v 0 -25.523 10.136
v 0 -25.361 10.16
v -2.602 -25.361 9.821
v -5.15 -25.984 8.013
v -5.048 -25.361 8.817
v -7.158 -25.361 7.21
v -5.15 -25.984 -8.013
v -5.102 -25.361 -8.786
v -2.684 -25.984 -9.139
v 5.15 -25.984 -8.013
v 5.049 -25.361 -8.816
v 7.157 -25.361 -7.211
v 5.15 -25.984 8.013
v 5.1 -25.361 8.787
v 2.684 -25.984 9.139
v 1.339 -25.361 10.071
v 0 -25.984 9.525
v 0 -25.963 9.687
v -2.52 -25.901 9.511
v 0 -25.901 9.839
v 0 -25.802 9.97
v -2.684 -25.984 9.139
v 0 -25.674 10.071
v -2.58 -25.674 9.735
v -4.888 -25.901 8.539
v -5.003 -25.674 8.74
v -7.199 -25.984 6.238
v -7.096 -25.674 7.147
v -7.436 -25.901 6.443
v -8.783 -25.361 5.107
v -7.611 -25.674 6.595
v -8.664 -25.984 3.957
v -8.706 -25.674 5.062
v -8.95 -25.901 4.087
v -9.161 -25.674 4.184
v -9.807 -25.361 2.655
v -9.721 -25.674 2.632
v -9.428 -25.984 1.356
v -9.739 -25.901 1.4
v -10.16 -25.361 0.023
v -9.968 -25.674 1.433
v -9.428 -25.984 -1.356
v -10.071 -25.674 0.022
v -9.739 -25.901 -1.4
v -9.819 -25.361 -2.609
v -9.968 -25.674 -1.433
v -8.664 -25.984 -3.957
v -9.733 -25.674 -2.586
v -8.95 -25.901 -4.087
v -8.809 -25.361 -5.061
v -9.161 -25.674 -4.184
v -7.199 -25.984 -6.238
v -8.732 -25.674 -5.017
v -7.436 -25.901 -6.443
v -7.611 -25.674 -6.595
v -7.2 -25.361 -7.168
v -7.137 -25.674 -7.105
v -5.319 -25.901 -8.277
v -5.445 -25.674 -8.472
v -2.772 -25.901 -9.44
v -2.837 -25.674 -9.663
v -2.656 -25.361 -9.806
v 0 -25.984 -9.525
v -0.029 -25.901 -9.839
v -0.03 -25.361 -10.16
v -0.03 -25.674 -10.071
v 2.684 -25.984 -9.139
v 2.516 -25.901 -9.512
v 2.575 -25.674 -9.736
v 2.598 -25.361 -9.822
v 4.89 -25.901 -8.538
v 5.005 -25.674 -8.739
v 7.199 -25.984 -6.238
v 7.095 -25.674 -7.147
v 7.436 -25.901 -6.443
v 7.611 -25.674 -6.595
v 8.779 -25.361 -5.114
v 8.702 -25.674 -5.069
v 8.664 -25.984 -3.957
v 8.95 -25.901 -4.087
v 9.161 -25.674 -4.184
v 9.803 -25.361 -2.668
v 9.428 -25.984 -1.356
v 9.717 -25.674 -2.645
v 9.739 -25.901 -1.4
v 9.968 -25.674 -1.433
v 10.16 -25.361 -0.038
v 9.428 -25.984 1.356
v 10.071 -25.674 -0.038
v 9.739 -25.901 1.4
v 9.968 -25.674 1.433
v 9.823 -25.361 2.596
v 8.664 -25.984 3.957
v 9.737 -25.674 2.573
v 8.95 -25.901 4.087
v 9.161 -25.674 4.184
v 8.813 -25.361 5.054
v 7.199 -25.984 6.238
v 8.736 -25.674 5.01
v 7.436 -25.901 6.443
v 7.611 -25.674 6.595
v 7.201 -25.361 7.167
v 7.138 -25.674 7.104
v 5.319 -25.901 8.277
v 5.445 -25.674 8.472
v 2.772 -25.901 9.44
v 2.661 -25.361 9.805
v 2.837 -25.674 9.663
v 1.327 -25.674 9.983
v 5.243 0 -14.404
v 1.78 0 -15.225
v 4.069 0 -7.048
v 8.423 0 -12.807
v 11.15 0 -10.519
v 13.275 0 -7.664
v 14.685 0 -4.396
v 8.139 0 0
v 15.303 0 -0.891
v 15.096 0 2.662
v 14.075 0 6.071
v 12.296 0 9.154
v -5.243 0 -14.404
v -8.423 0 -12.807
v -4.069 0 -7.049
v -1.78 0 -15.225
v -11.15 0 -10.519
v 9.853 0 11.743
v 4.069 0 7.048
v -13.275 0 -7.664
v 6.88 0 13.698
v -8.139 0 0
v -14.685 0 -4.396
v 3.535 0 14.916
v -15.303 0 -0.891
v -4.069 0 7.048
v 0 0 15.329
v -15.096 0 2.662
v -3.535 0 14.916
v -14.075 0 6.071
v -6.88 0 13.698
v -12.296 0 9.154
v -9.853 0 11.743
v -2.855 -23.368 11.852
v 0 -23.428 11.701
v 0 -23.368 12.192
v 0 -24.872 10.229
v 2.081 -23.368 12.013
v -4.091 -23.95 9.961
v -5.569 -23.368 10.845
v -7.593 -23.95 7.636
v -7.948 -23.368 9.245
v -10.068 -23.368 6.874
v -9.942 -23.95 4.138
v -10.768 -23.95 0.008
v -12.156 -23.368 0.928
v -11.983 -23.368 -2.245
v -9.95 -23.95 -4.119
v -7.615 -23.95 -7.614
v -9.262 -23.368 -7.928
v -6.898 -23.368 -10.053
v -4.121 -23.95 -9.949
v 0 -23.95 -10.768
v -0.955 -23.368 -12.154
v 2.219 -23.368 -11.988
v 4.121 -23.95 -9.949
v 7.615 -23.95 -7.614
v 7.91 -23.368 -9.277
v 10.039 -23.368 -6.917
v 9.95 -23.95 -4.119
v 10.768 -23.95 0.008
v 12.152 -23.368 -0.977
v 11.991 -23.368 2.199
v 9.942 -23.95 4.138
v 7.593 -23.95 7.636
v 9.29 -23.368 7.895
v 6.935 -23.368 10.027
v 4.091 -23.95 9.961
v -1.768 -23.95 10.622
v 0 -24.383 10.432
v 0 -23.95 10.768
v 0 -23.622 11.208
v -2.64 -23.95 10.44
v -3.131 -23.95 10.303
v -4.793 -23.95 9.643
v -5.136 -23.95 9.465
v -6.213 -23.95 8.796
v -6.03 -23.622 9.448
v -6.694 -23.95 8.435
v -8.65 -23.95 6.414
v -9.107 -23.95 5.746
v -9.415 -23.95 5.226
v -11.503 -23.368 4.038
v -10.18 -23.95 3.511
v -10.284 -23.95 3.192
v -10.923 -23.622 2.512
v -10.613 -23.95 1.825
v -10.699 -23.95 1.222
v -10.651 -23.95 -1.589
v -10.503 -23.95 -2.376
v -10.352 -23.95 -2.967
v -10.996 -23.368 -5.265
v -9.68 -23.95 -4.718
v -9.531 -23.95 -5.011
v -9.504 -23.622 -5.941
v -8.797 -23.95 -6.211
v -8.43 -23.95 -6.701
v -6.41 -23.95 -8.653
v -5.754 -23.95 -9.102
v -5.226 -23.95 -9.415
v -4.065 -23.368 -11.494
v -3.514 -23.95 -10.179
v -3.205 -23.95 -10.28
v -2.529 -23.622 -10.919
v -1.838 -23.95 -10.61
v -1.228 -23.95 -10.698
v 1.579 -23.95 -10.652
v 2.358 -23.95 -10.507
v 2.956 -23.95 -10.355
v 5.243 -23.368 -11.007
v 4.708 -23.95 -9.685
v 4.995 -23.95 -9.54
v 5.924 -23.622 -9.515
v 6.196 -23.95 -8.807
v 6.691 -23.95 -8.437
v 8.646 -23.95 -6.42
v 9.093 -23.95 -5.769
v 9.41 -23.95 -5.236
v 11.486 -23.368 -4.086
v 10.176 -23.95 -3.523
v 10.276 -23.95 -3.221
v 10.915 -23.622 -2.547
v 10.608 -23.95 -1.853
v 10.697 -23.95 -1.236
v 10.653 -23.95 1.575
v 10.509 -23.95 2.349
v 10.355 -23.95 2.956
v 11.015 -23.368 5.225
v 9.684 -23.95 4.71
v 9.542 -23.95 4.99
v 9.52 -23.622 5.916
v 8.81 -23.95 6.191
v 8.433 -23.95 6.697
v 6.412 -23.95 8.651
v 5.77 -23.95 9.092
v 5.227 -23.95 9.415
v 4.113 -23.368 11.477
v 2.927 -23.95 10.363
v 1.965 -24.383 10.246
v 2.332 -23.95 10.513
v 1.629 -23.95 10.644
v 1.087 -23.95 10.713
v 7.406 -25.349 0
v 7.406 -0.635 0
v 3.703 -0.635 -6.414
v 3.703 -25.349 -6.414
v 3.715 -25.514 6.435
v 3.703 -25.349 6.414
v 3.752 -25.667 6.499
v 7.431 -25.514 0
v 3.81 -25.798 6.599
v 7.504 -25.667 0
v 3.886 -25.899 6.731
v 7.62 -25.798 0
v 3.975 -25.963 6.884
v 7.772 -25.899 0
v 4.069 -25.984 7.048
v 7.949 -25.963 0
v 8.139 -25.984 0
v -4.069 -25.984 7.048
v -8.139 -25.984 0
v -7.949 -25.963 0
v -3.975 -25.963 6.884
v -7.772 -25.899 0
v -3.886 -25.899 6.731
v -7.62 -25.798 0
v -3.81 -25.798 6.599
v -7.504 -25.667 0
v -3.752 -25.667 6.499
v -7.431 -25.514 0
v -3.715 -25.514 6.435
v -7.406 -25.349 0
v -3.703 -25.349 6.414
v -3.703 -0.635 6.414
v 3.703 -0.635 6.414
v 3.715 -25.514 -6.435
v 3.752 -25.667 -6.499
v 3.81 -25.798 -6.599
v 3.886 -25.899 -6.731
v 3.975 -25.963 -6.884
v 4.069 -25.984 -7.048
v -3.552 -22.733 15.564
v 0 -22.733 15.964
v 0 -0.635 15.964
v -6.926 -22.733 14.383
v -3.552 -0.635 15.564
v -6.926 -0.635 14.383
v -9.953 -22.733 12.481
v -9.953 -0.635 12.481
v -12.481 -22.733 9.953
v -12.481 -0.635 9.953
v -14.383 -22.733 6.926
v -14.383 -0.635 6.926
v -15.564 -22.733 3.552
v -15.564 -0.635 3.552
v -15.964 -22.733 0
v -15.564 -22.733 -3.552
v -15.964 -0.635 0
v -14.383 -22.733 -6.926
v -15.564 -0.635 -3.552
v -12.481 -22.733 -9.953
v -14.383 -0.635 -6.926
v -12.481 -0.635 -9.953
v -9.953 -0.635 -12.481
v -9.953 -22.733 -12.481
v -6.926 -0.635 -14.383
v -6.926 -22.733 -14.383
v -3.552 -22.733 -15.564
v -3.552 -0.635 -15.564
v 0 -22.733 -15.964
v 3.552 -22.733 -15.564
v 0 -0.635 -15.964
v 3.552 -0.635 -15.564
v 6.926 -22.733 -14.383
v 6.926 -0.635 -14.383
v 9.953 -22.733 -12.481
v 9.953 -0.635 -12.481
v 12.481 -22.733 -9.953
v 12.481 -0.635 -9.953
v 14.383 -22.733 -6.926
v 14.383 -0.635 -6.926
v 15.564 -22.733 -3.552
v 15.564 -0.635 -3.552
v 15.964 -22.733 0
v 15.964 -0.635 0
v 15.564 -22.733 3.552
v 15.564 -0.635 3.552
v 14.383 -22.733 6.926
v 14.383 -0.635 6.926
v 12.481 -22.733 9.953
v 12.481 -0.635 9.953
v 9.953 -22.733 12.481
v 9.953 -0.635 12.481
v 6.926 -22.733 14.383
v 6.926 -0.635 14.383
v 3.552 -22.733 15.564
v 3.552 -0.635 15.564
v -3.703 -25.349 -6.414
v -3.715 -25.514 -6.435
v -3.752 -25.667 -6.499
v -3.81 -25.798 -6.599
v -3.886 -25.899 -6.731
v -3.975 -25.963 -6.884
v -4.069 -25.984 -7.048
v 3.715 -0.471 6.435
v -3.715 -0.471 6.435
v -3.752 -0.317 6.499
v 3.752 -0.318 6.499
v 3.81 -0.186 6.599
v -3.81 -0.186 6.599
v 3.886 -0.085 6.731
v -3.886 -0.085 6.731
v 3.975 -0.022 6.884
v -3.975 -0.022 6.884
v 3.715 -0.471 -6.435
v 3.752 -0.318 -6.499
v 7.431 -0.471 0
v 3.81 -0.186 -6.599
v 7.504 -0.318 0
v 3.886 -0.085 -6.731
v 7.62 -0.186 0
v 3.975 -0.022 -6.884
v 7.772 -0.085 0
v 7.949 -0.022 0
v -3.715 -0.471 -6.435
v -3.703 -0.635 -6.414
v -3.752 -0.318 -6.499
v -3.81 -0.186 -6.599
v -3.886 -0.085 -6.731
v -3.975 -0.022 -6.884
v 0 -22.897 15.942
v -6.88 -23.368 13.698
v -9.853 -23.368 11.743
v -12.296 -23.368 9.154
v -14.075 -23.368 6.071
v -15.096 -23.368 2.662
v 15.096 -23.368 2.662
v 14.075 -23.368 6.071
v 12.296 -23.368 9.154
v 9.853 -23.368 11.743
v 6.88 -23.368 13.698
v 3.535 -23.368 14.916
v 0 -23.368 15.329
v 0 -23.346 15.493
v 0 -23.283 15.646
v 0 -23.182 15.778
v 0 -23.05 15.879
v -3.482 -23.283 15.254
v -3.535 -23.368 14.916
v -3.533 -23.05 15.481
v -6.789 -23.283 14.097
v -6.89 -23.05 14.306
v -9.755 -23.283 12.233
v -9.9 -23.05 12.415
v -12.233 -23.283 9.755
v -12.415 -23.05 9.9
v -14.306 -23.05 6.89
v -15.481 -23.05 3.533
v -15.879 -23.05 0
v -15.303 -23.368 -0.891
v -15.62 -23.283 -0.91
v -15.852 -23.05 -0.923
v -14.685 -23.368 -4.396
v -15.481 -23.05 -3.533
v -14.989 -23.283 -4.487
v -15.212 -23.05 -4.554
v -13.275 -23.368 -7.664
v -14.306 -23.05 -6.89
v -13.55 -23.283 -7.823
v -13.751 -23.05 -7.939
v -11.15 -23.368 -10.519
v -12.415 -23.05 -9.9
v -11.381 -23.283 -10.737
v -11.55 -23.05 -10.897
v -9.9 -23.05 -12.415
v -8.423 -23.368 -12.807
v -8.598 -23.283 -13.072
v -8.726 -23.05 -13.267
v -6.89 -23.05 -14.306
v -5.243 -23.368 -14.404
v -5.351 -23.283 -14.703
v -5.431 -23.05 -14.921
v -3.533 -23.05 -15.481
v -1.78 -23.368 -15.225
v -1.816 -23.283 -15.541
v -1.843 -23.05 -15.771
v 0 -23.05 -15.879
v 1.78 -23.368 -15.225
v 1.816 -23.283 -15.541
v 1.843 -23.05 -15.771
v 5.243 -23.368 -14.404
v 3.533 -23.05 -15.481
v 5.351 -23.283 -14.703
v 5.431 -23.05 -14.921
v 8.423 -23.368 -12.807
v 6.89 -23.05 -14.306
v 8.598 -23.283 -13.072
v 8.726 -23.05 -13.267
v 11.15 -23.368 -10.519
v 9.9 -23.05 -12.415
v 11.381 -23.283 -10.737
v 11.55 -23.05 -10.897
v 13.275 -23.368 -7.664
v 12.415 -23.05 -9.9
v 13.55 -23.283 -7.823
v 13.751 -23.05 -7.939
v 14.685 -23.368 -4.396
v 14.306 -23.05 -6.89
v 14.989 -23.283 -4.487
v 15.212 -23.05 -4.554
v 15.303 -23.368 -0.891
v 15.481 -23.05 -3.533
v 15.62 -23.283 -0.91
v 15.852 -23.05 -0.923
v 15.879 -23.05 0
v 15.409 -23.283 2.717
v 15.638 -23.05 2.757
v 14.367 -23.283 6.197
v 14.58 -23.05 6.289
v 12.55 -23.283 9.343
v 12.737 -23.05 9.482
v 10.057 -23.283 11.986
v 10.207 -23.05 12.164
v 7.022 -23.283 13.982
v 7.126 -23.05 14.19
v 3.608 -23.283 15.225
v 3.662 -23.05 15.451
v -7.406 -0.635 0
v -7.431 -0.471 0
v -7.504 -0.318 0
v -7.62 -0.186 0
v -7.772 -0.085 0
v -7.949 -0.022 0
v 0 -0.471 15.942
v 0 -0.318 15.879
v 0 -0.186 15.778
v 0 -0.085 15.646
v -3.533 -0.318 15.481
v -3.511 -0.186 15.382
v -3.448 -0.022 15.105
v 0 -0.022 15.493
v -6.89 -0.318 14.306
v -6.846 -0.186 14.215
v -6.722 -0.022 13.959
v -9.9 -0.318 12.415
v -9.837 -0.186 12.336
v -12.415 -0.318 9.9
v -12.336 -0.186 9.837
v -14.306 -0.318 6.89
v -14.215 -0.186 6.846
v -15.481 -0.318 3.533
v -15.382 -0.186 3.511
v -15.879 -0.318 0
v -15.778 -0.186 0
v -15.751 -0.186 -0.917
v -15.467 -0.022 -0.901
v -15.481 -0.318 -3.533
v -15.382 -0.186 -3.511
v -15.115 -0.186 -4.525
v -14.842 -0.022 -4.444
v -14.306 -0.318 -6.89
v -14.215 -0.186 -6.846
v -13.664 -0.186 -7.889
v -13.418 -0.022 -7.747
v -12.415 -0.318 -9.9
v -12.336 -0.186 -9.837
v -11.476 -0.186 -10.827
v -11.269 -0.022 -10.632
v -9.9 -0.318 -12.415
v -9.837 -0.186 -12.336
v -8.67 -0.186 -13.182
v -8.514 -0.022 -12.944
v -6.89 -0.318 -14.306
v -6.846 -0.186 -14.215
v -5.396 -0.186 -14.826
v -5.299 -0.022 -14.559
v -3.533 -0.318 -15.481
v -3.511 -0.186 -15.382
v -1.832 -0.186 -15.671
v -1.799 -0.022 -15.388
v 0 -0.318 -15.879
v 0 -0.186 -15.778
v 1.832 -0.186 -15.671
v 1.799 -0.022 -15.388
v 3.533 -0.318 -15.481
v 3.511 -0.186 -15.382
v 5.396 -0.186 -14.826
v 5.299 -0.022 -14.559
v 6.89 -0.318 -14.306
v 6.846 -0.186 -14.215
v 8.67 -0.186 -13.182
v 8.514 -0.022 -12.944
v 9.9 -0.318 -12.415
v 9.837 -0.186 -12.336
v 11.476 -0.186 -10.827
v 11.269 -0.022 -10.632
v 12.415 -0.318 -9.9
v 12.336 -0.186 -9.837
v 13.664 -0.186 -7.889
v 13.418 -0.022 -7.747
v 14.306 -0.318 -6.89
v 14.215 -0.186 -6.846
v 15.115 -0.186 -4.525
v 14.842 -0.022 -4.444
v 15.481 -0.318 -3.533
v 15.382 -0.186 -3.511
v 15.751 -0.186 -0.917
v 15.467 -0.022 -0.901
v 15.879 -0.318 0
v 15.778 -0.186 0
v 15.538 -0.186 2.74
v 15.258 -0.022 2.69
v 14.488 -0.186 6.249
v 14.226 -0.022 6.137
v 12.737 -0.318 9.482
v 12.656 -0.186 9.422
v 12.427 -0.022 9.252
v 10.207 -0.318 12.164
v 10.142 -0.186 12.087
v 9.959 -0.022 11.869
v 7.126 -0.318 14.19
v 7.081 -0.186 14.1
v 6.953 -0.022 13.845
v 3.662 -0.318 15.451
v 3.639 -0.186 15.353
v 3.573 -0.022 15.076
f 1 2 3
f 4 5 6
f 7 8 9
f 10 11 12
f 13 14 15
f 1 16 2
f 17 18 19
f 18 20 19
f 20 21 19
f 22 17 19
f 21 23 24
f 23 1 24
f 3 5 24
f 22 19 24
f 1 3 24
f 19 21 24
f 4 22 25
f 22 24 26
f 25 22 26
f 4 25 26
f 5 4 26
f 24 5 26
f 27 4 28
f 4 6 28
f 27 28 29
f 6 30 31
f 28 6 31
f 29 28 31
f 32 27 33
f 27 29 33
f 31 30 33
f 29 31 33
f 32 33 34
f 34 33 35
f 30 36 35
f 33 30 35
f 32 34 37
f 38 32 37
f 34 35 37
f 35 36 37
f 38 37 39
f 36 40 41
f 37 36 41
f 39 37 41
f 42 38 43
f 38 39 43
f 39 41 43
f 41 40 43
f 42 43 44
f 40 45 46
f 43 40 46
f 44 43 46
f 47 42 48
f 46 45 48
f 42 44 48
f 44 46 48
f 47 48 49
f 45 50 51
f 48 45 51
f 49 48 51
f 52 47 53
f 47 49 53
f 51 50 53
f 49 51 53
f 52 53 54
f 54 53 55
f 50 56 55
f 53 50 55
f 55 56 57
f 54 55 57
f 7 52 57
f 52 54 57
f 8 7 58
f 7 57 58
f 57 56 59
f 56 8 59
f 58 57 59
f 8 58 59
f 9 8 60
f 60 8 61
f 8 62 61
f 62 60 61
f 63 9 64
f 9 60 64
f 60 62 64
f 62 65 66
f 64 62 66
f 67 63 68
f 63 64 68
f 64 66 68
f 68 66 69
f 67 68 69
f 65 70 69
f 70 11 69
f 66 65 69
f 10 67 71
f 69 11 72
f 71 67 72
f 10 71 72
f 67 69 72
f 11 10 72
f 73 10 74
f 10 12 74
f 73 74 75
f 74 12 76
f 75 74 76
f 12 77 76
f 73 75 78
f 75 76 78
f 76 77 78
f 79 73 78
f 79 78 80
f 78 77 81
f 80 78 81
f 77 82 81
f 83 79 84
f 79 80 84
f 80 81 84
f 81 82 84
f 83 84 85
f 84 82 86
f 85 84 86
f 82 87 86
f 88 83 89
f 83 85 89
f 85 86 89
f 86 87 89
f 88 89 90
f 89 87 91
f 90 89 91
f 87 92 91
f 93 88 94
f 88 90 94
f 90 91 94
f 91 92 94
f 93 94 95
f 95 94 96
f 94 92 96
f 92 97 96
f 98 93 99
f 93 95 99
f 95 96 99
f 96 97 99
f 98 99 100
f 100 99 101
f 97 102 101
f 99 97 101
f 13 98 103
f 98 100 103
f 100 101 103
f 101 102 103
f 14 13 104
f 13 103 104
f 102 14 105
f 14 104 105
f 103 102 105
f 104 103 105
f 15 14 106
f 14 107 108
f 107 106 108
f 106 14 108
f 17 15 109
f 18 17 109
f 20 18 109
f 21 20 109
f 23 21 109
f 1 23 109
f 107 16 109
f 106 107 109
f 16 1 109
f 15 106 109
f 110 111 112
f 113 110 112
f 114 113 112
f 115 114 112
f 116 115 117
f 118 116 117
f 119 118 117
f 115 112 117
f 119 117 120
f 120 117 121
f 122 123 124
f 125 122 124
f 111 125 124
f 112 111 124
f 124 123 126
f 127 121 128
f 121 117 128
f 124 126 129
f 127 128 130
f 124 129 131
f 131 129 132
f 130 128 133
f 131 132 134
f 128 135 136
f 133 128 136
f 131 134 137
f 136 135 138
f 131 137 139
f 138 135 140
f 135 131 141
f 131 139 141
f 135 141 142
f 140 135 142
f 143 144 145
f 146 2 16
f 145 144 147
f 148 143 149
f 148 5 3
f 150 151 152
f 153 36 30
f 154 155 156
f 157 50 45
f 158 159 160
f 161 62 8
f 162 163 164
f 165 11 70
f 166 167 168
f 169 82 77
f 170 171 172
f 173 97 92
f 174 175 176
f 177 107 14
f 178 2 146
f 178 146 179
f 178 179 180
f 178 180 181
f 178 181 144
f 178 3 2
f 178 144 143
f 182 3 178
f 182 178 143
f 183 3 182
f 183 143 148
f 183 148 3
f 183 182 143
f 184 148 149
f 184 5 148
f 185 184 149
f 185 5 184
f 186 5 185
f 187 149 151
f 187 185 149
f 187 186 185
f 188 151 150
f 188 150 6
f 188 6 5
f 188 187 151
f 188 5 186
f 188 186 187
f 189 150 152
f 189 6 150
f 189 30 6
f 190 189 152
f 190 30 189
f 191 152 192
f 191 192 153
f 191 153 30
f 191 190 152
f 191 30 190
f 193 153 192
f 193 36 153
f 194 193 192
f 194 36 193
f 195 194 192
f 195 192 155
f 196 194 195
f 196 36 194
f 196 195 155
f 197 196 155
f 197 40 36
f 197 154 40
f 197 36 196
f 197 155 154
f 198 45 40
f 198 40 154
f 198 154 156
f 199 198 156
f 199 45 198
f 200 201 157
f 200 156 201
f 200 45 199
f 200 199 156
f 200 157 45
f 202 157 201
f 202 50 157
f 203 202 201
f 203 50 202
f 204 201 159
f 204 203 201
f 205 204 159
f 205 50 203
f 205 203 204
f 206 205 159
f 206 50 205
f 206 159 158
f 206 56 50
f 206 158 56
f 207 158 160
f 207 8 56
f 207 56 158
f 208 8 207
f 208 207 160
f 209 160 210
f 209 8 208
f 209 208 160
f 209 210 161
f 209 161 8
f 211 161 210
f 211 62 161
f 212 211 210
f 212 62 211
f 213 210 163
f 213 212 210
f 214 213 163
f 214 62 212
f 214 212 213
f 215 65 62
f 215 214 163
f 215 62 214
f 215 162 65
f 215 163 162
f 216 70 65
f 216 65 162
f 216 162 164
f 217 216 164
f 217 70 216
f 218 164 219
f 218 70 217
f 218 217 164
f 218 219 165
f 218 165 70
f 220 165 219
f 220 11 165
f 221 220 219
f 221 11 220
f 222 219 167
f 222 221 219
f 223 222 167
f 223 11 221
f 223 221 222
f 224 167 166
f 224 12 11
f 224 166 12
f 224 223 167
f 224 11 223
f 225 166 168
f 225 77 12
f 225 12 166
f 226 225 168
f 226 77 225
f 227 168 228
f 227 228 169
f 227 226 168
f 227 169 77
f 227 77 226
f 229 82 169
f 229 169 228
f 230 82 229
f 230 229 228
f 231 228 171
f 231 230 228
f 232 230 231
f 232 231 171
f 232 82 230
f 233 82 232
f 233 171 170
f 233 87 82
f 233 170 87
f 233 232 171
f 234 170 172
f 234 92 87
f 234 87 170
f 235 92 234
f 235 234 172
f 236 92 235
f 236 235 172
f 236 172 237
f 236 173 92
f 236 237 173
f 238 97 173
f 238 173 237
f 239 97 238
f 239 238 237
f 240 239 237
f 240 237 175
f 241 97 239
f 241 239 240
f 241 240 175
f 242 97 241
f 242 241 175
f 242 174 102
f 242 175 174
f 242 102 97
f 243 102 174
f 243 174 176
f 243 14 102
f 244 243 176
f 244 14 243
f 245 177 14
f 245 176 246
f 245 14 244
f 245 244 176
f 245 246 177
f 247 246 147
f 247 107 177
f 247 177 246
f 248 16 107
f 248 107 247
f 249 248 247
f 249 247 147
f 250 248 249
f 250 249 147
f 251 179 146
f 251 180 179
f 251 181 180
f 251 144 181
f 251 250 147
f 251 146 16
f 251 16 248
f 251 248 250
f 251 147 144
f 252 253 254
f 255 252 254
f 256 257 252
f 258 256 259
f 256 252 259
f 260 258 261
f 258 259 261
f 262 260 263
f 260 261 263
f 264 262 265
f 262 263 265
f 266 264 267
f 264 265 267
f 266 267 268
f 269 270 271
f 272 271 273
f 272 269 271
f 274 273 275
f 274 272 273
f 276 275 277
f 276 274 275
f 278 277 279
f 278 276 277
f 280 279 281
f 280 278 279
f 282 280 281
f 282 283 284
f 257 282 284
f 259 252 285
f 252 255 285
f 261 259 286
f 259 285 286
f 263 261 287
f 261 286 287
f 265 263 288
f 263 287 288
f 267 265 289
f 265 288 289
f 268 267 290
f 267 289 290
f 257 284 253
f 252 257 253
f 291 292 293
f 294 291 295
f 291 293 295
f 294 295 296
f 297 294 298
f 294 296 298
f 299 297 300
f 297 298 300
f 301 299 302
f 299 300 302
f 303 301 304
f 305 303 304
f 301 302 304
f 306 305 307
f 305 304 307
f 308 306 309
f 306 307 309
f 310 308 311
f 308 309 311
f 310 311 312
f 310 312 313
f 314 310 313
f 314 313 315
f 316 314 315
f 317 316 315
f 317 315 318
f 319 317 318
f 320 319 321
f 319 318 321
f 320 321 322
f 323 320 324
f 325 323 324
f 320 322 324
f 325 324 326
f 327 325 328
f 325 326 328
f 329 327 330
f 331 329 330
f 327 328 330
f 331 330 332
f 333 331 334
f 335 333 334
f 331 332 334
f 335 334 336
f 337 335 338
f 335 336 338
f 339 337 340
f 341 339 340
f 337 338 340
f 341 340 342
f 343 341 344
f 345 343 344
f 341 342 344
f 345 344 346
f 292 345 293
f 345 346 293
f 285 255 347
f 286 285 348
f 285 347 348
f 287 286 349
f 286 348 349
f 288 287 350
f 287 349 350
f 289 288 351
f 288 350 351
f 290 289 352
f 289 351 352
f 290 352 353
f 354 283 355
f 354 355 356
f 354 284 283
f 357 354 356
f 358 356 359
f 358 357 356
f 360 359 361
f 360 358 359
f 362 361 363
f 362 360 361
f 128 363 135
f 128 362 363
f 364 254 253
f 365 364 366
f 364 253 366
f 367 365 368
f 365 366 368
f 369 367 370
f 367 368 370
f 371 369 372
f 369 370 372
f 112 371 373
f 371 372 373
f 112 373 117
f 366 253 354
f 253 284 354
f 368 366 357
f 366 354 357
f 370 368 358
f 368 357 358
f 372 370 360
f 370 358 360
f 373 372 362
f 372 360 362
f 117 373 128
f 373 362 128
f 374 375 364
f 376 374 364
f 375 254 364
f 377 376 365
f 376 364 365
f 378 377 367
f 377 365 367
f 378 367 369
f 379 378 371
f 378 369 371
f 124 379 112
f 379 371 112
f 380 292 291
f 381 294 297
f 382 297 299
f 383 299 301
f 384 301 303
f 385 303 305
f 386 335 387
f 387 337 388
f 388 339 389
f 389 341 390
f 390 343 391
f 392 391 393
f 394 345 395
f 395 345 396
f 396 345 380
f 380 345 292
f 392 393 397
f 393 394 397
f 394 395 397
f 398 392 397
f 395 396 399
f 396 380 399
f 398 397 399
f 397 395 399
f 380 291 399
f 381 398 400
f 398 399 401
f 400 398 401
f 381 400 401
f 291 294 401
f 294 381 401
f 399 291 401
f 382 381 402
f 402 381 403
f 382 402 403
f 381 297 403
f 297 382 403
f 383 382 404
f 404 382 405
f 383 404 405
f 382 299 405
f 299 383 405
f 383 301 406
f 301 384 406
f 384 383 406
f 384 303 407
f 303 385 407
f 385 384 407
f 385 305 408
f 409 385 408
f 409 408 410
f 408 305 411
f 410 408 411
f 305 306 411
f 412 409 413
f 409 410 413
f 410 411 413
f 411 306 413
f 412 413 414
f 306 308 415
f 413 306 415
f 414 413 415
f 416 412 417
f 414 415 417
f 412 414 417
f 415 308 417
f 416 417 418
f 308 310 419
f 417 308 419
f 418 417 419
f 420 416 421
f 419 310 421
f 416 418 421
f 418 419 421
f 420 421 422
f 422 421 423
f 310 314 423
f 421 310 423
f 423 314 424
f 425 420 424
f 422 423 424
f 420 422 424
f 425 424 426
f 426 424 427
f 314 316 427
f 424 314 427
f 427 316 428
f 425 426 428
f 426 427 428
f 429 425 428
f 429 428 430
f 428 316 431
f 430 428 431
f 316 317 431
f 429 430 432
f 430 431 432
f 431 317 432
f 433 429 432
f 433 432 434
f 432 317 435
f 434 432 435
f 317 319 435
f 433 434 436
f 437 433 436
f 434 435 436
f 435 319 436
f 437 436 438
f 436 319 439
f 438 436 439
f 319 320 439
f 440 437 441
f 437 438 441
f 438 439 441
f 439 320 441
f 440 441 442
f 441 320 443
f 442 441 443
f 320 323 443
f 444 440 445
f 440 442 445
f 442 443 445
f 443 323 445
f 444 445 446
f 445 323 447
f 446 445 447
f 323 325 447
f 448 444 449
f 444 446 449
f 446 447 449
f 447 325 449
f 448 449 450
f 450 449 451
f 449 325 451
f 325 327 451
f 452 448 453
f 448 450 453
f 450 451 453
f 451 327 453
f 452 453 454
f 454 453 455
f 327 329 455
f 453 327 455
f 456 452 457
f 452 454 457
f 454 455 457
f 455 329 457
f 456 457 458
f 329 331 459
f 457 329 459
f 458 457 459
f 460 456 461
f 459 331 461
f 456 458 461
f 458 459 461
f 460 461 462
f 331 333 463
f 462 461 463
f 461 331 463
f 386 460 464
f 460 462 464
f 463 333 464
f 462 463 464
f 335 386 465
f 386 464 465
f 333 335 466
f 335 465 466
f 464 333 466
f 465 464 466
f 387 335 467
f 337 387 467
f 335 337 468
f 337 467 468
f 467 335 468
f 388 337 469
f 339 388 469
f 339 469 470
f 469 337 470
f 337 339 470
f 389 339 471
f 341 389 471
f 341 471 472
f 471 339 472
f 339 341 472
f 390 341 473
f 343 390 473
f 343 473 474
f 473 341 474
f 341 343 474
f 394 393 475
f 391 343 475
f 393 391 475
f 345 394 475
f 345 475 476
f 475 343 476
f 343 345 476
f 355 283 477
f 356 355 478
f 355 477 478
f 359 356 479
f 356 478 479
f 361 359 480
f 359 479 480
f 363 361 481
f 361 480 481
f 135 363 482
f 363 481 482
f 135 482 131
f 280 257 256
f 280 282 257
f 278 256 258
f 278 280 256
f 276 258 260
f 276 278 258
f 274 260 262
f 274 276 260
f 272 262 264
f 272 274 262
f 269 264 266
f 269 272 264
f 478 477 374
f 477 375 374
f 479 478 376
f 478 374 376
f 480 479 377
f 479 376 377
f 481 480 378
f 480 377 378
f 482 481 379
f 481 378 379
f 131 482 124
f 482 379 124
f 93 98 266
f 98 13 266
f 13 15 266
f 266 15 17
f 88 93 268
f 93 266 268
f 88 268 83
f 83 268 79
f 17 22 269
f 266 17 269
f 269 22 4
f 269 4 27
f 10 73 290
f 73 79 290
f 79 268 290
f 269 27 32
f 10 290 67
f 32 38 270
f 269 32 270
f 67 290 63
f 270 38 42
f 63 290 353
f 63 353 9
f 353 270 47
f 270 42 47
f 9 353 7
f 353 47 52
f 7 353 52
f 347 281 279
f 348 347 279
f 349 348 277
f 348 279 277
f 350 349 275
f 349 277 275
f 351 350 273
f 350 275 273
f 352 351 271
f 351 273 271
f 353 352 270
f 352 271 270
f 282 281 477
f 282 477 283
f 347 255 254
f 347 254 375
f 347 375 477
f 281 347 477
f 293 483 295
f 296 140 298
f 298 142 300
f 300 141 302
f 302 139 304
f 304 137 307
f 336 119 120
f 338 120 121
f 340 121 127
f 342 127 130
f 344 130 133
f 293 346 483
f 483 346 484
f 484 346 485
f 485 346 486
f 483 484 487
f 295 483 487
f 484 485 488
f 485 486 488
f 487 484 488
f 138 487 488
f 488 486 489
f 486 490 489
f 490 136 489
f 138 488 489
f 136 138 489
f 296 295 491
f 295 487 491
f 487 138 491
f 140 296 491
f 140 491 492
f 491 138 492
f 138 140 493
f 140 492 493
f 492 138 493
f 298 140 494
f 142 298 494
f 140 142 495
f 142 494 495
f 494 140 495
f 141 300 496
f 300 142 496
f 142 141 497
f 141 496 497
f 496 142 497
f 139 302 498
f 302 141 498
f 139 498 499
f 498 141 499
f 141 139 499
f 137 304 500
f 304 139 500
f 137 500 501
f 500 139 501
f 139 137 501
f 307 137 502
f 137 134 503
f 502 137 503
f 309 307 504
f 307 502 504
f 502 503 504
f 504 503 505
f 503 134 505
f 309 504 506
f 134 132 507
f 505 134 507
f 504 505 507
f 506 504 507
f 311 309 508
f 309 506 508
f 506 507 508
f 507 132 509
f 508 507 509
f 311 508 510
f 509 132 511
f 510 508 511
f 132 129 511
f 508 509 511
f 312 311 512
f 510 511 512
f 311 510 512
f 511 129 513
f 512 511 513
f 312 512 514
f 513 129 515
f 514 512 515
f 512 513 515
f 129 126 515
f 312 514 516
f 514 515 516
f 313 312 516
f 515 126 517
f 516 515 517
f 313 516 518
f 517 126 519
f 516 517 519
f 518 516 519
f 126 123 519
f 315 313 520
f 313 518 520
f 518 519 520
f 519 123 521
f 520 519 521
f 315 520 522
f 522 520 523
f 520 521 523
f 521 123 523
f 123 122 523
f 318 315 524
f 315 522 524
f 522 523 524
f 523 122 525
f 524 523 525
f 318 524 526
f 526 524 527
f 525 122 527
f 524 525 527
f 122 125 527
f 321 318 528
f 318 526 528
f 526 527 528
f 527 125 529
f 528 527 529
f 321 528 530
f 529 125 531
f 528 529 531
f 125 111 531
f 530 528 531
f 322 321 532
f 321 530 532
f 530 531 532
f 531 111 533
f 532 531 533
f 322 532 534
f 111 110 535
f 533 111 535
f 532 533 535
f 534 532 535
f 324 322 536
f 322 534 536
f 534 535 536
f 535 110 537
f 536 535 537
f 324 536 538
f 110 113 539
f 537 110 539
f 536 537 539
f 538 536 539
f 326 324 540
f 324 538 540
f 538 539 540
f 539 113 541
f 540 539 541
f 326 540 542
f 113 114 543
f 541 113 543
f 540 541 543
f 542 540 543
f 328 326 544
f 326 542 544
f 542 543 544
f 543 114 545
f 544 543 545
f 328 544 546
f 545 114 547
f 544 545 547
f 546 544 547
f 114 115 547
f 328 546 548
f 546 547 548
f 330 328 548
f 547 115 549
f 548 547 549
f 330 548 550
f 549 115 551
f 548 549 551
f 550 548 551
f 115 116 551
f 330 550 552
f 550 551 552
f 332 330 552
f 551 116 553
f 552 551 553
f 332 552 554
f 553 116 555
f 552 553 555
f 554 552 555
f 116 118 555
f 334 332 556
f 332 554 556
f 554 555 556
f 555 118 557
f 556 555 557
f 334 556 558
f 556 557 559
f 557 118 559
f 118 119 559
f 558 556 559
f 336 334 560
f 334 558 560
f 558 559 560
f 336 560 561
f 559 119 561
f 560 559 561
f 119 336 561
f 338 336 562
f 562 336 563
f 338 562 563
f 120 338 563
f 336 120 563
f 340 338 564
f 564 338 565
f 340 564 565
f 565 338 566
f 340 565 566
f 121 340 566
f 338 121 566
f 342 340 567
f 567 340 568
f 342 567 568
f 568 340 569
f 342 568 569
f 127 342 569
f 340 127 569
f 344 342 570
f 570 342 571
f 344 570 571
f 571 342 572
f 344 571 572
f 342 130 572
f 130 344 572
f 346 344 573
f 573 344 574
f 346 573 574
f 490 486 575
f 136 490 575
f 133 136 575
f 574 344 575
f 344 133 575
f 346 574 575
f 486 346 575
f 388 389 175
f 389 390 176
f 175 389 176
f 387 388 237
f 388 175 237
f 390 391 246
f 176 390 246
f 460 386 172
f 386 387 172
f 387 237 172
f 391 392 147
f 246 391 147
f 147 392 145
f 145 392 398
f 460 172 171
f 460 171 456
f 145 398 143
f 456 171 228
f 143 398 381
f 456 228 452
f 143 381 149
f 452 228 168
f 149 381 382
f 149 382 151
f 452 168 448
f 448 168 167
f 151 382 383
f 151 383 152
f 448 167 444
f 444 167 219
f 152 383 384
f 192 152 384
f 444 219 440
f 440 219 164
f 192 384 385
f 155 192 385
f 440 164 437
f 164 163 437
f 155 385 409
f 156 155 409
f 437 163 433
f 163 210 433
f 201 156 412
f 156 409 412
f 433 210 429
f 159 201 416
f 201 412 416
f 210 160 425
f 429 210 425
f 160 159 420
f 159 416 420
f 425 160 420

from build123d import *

# Parameters (mm, degrees)
CUT_EXTRUDE1_DEPTH = 35.421953112
FILLET1_R          = 0.635
FILLET2_R          = 2.032


with BuildPart() as part:
    # Sketch3 → Revolve1 (revolve)
    with BuildSketch(Plane(origin=(0, 0, 0), x_dir=(0, 0, -1), z_dir=(1, 0, 0)), mode=Mode.PRIVATE) as revolve1_sk:
        Polygon((6.4135, 0), (6.4135, -25.9842), (10.16, -25.9842), (10.16, -23.368), (15.9639, -23.368), (15.9639, 0), align=None)
    revolve(revolve1_sk.sketch.rotate(Axis((0, 17.16060519, 0), (0, -1, 0)), 180), axis=Axis((0, 17.16060519, 0), (0, -1, 0)))

    # Sketch2 → Cut-Extrude1 (cut, through all)
    with BuildSketch(Plane(origin=(0, 0, 0), x_dir=(1, 0, 0), z_dir=(0, 1, 0))):
        Polygon((7.405671903, 0), (3.702835951, 6.4135), (-3.702835951, 6.4135), (-7.405671903, 0), (-3.702835951, -6.4135), (3.702835951, -6.4135), align=None)
    extrude(amount=-CUT_EXTRUDE1_DEPTH, mode=Mode.SUBTRACT)

    # Fillet1
    fillet1_edges = [part.edges().sort_by_distance(p)[0] for p in [
        (5.554253927, -25.9842, -3.20675),
        (5.554253927, -25.9842, 3.20675),
        (0, -25.9842, -6.4135),
        (0, -25.9842, 6.4135),
        (-5.554253927, -25.9842, -3.20675),
        (-5.554253927, -25.9842, 3.20675),
        (0, 0, 6.4135),
        (-5.554253927, 0, 3.20675),
        (-5.554253927, 0, -3.20675),
        (0, 0, -6.4135),
        (5.554253927, 0, -3.20675),
        (5.554253927, 0, 3.20675),
        (0, 0, -15.9639),
        (0, -23.368, -15.9639),
        (0, -25.9842, -10.16),
    ]]
    fillet(fillet1_edges, radius=FILLET1_R)

    # Fillet2
    fillet2_edges = [part.edges().sort_by_distance(p)[0] for p in [
        (0, -23.368, -10.16),
    ]]
    fillet(fillet2_edges, radius=FILLET2_R)


solid = part.part
